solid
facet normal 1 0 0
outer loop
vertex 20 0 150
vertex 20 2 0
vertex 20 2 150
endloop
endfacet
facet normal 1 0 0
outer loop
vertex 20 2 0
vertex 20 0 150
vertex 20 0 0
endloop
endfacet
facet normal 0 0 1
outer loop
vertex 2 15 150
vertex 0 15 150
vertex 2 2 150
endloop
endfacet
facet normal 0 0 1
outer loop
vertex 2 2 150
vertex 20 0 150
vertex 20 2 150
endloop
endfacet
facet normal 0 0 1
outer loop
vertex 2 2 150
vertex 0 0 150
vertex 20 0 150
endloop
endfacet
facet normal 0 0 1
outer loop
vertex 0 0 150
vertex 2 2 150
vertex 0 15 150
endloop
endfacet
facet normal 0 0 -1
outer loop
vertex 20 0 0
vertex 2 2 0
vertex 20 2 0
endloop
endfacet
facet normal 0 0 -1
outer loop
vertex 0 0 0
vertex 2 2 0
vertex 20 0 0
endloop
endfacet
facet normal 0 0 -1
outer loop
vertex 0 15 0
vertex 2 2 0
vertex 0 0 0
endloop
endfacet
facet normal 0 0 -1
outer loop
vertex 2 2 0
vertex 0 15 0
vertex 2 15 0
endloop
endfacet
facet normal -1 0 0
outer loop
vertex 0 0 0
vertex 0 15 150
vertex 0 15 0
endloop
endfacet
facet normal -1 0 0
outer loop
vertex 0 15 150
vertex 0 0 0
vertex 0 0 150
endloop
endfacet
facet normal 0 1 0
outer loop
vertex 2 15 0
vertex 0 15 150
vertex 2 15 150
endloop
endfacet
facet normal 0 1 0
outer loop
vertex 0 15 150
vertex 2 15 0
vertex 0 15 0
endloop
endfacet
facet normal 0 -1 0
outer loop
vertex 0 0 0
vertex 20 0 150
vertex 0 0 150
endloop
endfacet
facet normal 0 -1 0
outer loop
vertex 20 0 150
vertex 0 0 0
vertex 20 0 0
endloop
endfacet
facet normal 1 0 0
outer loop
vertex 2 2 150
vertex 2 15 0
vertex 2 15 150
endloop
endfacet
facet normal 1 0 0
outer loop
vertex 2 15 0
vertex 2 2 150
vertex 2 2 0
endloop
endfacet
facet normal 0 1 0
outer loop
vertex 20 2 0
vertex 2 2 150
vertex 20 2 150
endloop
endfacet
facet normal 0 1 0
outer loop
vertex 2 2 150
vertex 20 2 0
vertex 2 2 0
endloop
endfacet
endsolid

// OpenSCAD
// file: ../../parameters.scad
//configuration file for our cloud chamber



//peltier cells
peltier_size = 40;
peltier_thickness = 2.9;

////ALU profiles

//L_profile 2015
L_2015_width = 20;
L_2015_height = 15;
L_2015_thickness = 2;
// main file
include <../../parameters.scad>

module L_2015_profile(height=100) {
    difference() {
        cube([L_2015_width, L_2015_height, height]);

        translate([L_2015_thickness, L_2015_thickness, -0.1])
            cube([L_2015_width, L_2015_height, height+0.2]);
    }
}

L_2015_profile(150);
